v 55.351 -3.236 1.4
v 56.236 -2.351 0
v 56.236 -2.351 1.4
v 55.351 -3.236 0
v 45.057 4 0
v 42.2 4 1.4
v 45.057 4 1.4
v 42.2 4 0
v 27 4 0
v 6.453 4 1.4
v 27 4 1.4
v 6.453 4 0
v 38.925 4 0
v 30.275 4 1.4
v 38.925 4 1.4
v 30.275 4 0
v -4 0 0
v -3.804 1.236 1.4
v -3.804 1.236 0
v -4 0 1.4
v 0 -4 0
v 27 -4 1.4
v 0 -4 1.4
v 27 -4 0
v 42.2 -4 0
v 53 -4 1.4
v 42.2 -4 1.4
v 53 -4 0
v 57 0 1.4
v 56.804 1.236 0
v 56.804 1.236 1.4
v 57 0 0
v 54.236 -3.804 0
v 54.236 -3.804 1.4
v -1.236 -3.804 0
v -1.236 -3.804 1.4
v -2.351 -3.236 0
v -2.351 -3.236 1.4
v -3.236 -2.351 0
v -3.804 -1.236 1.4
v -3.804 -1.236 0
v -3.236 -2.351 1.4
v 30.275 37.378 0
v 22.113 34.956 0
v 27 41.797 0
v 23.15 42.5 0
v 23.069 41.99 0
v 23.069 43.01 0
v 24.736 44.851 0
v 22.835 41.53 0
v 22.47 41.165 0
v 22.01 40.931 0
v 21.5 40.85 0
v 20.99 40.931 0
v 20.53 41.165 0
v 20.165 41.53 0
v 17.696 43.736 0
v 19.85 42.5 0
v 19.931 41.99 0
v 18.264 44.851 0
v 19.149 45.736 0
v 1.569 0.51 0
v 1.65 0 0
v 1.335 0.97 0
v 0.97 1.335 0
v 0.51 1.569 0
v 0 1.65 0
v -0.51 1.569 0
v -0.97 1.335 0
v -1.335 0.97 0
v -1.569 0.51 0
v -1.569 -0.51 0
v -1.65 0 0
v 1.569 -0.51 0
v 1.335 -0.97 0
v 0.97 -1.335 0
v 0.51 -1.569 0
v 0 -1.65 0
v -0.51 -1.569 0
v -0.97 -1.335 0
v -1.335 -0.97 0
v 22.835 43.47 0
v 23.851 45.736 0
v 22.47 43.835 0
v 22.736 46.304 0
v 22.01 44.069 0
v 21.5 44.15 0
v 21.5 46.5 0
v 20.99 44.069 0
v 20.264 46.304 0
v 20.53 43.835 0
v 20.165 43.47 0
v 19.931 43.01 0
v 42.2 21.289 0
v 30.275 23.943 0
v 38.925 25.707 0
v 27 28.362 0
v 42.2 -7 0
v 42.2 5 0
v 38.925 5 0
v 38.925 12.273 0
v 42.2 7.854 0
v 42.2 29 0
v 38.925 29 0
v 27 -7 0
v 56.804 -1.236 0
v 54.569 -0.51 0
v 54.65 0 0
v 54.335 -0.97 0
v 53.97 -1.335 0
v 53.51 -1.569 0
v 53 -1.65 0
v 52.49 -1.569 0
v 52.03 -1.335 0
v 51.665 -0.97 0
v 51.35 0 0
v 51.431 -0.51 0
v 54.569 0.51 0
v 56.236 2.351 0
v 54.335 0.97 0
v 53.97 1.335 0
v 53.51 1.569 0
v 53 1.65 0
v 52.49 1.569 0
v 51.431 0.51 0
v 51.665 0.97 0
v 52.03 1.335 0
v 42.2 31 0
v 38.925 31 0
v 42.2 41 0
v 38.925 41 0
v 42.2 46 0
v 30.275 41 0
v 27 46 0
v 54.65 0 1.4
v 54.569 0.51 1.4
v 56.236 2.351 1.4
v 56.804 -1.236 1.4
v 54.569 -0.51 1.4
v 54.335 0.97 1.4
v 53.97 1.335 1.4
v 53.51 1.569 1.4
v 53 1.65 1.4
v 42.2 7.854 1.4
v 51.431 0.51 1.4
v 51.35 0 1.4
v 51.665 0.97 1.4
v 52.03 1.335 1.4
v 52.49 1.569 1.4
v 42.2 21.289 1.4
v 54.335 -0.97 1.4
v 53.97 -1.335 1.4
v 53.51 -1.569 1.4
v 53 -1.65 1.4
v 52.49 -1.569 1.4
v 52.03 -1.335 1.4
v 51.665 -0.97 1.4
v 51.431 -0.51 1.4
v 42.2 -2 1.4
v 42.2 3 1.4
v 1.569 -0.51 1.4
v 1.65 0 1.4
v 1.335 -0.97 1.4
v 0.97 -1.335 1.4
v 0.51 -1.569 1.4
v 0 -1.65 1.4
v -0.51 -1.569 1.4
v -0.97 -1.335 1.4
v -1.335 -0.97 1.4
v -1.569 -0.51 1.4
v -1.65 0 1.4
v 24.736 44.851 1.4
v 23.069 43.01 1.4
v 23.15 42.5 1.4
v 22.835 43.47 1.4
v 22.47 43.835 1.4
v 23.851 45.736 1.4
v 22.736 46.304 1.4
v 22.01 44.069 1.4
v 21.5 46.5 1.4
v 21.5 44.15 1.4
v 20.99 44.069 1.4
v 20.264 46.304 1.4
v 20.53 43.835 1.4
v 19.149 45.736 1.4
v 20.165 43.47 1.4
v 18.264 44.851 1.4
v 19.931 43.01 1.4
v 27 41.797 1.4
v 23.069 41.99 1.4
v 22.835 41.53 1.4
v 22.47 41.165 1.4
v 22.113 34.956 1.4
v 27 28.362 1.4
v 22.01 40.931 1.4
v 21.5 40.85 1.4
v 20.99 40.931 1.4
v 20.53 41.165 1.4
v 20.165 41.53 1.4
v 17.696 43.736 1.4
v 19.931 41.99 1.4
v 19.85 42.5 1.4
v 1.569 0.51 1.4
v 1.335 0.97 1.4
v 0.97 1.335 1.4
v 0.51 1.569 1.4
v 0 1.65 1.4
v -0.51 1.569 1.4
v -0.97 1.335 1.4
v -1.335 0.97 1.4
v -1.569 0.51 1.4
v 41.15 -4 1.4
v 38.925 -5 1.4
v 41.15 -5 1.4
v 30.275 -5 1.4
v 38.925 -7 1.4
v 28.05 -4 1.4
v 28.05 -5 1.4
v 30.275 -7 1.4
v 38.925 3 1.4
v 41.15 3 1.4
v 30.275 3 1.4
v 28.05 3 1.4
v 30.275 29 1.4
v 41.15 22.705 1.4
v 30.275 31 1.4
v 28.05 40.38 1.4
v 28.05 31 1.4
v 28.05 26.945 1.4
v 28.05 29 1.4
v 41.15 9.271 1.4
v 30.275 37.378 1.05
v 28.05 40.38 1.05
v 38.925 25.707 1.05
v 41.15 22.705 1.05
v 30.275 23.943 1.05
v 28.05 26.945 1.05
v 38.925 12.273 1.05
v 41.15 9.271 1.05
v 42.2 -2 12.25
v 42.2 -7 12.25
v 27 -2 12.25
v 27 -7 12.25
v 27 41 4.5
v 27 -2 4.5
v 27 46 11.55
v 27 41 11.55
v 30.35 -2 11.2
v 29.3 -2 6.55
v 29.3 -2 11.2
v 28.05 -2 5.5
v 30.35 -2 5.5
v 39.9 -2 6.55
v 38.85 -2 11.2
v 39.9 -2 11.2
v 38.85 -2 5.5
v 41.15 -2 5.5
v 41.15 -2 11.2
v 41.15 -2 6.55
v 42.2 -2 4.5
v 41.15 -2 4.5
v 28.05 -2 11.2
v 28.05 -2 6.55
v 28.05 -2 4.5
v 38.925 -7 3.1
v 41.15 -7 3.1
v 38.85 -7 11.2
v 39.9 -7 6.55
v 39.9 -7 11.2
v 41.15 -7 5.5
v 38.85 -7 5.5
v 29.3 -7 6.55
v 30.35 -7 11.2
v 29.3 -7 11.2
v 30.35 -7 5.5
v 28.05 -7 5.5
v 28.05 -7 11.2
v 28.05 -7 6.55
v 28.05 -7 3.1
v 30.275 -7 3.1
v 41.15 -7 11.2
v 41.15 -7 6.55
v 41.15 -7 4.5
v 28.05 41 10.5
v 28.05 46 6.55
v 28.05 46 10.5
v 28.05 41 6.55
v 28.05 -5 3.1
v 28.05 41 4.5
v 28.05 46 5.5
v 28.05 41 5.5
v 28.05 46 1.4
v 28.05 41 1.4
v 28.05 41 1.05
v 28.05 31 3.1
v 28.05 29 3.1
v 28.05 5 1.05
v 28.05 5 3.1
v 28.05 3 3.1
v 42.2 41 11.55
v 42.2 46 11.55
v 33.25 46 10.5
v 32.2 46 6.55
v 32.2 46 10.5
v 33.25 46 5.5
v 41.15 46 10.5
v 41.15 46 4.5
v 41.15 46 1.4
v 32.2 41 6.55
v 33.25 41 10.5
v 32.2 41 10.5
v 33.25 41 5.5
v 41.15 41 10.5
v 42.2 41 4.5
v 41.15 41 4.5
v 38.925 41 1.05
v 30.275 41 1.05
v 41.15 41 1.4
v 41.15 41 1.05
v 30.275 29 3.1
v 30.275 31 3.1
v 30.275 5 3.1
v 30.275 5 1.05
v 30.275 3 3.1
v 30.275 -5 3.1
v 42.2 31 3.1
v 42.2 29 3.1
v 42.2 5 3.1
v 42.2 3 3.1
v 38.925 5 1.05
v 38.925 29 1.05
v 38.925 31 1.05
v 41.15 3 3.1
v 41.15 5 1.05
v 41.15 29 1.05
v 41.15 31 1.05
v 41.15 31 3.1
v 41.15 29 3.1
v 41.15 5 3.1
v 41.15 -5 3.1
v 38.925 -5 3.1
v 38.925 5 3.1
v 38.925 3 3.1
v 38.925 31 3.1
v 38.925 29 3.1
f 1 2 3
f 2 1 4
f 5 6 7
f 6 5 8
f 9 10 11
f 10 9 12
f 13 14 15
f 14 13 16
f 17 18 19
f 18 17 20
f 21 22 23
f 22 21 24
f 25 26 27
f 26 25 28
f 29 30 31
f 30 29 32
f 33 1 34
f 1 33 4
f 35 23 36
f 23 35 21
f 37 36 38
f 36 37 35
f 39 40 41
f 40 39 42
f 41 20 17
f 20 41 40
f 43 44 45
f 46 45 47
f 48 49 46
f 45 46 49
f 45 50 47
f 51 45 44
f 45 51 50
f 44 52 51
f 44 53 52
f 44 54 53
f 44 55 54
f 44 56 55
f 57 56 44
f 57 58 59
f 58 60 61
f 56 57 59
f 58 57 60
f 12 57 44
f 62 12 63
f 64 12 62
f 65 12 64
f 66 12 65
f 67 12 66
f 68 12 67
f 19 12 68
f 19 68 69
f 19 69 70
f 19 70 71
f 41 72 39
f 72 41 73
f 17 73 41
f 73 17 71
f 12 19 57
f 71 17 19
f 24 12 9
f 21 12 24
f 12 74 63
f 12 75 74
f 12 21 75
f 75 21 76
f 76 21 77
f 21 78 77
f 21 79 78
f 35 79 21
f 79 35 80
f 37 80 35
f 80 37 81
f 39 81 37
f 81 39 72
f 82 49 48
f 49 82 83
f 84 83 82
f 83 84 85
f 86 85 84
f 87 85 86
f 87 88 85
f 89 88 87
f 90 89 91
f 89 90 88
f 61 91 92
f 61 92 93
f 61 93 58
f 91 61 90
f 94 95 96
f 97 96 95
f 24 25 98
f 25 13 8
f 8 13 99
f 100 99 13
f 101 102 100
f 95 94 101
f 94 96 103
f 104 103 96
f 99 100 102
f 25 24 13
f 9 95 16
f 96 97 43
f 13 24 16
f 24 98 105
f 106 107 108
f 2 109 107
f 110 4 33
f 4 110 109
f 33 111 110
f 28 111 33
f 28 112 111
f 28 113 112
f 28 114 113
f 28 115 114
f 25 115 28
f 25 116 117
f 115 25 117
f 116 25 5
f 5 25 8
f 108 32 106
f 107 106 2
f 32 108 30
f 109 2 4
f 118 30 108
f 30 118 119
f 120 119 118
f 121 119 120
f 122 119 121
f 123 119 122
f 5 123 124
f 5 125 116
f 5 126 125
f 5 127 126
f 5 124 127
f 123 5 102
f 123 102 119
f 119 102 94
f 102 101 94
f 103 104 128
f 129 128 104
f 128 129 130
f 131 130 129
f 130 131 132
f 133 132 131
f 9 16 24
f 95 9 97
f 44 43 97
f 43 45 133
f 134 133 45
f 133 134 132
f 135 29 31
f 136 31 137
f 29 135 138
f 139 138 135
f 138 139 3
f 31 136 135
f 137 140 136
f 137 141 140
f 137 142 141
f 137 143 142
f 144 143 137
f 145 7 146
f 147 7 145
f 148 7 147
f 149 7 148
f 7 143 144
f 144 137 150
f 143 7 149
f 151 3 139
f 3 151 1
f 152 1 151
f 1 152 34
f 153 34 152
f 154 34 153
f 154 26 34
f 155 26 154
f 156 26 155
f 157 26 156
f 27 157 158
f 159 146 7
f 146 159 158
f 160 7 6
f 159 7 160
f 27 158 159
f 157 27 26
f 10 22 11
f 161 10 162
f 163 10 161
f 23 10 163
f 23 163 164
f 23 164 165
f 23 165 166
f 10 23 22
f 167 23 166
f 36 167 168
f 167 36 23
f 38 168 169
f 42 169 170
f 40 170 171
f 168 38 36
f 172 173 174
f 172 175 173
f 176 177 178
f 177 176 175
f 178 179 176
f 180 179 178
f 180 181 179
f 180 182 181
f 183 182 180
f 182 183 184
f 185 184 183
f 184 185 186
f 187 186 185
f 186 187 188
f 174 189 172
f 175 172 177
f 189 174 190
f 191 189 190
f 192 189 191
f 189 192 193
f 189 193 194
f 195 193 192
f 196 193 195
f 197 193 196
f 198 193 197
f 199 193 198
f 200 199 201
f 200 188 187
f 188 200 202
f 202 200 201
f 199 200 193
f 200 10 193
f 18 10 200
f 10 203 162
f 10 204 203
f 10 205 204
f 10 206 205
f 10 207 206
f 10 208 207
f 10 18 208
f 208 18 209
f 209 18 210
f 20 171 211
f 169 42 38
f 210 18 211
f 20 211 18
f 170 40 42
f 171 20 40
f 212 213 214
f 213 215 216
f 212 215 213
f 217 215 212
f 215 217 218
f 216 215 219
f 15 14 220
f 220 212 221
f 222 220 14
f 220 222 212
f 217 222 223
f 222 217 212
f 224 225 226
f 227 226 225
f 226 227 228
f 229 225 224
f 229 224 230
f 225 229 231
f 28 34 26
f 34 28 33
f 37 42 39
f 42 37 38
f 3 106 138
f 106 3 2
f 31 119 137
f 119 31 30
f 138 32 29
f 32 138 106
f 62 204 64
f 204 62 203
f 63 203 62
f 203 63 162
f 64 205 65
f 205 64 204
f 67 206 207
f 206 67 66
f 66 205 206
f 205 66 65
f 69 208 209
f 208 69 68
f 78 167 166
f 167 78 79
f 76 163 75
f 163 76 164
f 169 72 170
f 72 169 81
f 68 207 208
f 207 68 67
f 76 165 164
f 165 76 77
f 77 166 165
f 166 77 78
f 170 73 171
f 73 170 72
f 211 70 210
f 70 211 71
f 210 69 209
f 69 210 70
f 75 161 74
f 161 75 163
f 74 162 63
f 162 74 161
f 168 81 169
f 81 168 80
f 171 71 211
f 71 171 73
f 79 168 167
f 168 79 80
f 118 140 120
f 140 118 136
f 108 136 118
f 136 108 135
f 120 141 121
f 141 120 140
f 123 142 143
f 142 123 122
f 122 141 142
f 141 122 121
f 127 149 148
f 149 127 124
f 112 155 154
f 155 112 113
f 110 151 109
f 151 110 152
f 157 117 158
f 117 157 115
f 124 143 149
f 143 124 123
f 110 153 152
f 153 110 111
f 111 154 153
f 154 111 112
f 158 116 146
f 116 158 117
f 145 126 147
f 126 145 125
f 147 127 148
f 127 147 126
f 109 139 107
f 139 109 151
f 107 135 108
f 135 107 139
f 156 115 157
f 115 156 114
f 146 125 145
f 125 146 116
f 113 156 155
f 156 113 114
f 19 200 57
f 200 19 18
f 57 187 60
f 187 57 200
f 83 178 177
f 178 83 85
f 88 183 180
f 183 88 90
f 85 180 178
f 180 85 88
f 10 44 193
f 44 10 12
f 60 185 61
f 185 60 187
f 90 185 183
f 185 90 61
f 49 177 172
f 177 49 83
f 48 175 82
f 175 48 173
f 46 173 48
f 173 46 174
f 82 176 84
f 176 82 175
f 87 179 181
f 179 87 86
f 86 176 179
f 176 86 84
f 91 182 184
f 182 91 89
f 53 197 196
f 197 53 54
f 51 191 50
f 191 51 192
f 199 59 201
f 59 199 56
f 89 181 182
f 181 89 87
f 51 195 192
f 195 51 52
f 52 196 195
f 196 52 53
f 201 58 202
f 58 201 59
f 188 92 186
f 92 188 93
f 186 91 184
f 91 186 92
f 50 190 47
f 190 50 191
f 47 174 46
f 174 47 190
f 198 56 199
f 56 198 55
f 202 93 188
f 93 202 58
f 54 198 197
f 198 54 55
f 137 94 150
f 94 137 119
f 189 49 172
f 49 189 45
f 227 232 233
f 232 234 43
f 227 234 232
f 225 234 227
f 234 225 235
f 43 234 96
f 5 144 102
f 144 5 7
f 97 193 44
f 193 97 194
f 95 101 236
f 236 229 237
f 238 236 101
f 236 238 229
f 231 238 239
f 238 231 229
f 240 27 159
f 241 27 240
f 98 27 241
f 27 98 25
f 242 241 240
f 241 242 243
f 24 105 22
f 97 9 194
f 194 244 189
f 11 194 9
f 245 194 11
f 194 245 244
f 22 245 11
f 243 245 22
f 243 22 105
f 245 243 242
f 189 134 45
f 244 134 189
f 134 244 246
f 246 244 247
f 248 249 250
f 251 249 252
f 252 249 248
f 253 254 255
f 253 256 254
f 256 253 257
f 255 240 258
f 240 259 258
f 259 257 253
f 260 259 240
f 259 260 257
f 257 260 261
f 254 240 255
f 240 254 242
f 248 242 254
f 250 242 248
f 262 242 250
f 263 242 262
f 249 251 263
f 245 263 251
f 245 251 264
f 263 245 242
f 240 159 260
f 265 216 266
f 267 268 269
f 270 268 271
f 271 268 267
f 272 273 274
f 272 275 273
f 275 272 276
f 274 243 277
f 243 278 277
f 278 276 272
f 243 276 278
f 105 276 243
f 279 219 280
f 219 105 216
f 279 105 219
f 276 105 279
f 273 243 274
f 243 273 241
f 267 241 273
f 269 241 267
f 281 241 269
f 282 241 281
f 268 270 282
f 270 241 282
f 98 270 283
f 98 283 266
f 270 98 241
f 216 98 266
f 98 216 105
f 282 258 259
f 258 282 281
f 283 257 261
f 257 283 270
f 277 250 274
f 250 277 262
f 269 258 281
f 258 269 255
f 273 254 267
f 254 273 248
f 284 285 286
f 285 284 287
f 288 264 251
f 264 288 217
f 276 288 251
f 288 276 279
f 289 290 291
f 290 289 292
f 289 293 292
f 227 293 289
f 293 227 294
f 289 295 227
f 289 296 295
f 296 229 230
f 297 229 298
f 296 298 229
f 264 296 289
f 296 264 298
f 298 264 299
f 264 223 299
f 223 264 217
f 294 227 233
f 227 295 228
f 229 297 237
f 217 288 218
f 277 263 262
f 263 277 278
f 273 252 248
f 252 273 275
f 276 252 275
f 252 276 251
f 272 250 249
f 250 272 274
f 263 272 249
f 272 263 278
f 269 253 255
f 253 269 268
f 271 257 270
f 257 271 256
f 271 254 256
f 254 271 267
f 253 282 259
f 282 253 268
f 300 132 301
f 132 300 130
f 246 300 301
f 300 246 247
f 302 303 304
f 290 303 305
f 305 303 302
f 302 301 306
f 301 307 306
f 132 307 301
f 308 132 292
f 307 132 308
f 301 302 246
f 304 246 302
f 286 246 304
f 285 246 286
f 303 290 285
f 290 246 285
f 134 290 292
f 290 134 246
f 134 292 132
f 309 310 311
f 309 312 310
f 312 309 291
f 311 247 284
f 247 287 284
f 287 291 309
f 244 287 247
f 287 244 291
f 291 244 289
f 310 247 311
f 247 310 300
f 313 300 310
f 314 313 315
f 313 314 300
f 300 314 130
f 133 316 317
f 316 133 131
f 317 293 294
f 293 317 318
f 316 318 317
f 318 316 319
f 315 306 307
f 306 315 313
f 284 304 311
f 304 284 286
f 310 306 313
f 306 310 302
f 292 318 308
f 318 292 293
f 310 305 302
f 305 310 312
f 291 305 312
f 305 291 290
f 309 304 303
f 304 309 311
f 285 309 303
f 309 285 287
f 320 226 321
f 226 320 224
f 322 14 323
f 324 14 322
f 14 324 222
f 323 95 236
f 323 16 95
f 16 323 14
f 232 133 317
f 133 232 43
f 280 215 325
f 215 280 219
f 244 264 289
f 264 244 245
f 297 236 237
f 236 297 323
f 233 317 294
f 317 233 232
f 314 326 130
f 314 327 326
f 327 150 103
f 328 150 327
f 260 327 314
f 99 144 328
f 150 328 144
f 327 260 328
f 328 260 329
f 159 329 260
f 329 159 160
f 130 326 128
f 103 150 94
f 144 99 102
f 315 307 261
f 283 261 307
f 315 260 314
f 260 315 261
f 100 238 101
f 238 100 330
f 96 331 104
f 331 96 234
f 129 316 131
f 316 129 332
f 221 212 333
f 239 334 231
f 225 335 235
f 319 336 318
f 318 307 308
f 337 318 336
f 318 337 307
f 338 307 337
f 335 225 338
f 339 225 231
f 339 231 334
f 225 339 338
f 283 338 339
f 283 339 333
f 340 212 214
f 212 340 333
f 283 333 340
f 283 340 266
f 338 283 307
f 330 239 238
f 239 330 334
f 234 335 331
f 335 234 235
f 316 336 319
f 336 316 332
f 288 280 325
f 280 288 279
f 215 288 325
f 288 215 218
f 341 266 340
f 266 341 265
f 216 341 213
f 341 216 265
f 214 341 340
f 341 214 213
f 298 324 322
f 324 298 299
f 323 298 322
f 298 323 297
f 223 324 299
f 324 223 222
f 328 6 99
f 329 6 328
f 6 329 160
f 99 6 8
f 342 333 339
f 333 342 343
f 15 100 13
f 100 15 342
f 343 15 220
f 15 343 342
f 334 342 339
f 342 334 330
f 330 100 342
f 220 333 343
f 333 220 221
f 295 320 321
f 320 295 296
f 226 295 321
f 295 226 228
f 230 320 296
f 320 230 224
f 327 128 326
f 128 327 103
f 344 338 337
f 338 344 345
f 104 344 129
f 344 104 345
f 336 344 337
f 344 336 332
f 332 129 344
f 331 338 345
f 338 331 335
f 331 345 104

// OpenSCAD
// Bracket to mount a fan board in the NVR

hdd25i_screw_d  = 2.9 + 0.4;
hdd25i_screw_hd = 6.9 + 0.4;

// Some material definitions
// defaults in prusa slicer 0.15 height (0.2 first layer)
layer_1=0.2;
layer_n=0.15;
base_h=layer_1+layer_n*8;
base_d=8;

$fn=20;

// Some functions (modules)

// a frame part will simply draw a connection between two
// mounting positions. 
module frame_part(
    m1, m2,
    d1 = hdd25i_screw_d, // screw hole
    d2 = hdd25i_screw_hd,  // screw head
    d3 = 8,    // frame width
    sheet = base_h
) {
    difference() {
        hull() {
            // mount 1
            translate(m1)
                cylinder(h=base_h,d=d3);
            // mount 2
            translate(m2)
                cylinder(h=base_h,d=d3);
        }
        // remove bigger part
        translate([0,0,-0.01]) {
            translate(m1)
                cylinder(h=base_h+0.02, d=d2-0.1, $fn=20);
            translate(m2)
                cylinder(h=base_h+0.02, d=d2-0.1, $fn=20);
        }
    }
    translate(m1)
        difference() {
            cylinder(h=sheet,d=d2,$fn=20);
            translate([0,0,-0.01])
                cylinder(h=sheet+0.02,d=d1,$fn=20);
        }
    translate(m2)
        difference() {
            cylinder(h=sheet,d=d2,$fn=20);
            translate([0,0,-0.01])
                cylinder(h=sheet+0.02,d=d1,$fn=20);
        }
}

// Now we can start constructing our custom bracket

// First some mounting position definitons (around the center)
m1=[ 0.0, 0.0];
m2=[53.0, 0.0];
mx=[21.5, 0.0];
m3=[21.5,42.5];

print_b      = 13+0.1;
print_l      = 53;
print_h      = 1.2+0.2; // print board thickness
print_clr    = 1.5+0.2; // soldered components stick out
print_hdr1_h = 6.5+0.2; // bigger header (2fan)
print_hdr1_w = 8.1+0.2;
print_hdr2_h = 5.8+0.2; // smaller header (2ntc)
print_hdr2_w = 7.5+0.2;

print_hdr1_hc = print_clr+print_h+print_hdr1_h;
print_hdr1_l  = (print_b - print_hdr1_w - 0.2) / 2;

print_hdr2_hc = print_clr+print_h+print_hdr2_h;
print_hdr2_l = print_b - print_hdr2_w - 0.2;

// Draw the frame parts
frame_part(m1,m2);
frame_part(m1,m3);
*frame_part(mx,m3,d3=4);
frame_part(m2,m3);

sheet=layer_n*7; // sheet material is mostly thin
sheet2=sheet*2;

module header(
    x     = 0,
    y     = 0,
    left  = 0,
    right = 0,
    b     = print_b,
    hdr_h = print_hdr1_hc,
    
) {
  difference() {
    translate([x       , y     , 0                 ])
        cube( [b+sheet2, 5     , base_h+hdr_h+sheet]);
    translate([x+sheet , y-0.01, base_h            ])
        cube( [b       , 5+0.02, hdr_h             ]);
  }
  clearance=print_clr+print_h+1;
  if (left != 0) {
    translate([x+left,y,base_h+clearance])
        cube([sheet,5,hdr_h-clearance]);
    translate([x,y,base_h+clearance])
        cube([left,5,sheet]);
  }
  if (right != 0) {
      translate([x+sheet+b-right,y,base_h+clearance])
        cube([sheet,5,hdr_h-clearance]);
      translate([x+sheet+b-right,y,base_h+clearance])
        cube([right+sheet,5,sheet]);
  }
}

translate([27,-7,0]) {
    header(
        y=0,        
        hdr_h=print_hdr1_hc,
        left=print_hdr1_l,right=print_hdr1_l);
    header(
        y=print_l-5,
        hdr_h=print_hdr2_hc,
        left=print_hdr2_l );
    // connection between the header
    railing=base_h+print_clr+print_h;
    difference() {
        cube([print_b/4,print_l,railing]);
        translate([sheet,-0.01,sheet])
            cube([print_b/4,print_l+0.02,railing]);
    }
    translate([print_b*3/4+sheet2,0,0]) {
        difference() {
            cube([print_b/4,print_l,railing]);
            translate([-sheet,-0.01,sheet])
                cube([print_b/4,print_l+0.02,railing]);
        }
    }
    // keeping print clearance
    bumper=base_h+print_clr;
    translate([0,0,0]) 
        cube([print_b/4,2,bumper]);
    translate([sheet2+print_b*3/4,0,0]) 
        cube([print_b/4,2,bumper]);
    translate([0,10,0]) 
        cube([print_b/4,2,bumper]);
    translate([sheet2+print_b*3/4,10,0]) 
        cube([print_b/4,2,bumper]);
    translate([0,print_l-15-2,0]) 
        cube([print_b/4,2,bumper]);
    translate([sheet2+print_b*3/4,print_l-15-2,0]) 
        cube([print_b/4,2,bumper]);
}
